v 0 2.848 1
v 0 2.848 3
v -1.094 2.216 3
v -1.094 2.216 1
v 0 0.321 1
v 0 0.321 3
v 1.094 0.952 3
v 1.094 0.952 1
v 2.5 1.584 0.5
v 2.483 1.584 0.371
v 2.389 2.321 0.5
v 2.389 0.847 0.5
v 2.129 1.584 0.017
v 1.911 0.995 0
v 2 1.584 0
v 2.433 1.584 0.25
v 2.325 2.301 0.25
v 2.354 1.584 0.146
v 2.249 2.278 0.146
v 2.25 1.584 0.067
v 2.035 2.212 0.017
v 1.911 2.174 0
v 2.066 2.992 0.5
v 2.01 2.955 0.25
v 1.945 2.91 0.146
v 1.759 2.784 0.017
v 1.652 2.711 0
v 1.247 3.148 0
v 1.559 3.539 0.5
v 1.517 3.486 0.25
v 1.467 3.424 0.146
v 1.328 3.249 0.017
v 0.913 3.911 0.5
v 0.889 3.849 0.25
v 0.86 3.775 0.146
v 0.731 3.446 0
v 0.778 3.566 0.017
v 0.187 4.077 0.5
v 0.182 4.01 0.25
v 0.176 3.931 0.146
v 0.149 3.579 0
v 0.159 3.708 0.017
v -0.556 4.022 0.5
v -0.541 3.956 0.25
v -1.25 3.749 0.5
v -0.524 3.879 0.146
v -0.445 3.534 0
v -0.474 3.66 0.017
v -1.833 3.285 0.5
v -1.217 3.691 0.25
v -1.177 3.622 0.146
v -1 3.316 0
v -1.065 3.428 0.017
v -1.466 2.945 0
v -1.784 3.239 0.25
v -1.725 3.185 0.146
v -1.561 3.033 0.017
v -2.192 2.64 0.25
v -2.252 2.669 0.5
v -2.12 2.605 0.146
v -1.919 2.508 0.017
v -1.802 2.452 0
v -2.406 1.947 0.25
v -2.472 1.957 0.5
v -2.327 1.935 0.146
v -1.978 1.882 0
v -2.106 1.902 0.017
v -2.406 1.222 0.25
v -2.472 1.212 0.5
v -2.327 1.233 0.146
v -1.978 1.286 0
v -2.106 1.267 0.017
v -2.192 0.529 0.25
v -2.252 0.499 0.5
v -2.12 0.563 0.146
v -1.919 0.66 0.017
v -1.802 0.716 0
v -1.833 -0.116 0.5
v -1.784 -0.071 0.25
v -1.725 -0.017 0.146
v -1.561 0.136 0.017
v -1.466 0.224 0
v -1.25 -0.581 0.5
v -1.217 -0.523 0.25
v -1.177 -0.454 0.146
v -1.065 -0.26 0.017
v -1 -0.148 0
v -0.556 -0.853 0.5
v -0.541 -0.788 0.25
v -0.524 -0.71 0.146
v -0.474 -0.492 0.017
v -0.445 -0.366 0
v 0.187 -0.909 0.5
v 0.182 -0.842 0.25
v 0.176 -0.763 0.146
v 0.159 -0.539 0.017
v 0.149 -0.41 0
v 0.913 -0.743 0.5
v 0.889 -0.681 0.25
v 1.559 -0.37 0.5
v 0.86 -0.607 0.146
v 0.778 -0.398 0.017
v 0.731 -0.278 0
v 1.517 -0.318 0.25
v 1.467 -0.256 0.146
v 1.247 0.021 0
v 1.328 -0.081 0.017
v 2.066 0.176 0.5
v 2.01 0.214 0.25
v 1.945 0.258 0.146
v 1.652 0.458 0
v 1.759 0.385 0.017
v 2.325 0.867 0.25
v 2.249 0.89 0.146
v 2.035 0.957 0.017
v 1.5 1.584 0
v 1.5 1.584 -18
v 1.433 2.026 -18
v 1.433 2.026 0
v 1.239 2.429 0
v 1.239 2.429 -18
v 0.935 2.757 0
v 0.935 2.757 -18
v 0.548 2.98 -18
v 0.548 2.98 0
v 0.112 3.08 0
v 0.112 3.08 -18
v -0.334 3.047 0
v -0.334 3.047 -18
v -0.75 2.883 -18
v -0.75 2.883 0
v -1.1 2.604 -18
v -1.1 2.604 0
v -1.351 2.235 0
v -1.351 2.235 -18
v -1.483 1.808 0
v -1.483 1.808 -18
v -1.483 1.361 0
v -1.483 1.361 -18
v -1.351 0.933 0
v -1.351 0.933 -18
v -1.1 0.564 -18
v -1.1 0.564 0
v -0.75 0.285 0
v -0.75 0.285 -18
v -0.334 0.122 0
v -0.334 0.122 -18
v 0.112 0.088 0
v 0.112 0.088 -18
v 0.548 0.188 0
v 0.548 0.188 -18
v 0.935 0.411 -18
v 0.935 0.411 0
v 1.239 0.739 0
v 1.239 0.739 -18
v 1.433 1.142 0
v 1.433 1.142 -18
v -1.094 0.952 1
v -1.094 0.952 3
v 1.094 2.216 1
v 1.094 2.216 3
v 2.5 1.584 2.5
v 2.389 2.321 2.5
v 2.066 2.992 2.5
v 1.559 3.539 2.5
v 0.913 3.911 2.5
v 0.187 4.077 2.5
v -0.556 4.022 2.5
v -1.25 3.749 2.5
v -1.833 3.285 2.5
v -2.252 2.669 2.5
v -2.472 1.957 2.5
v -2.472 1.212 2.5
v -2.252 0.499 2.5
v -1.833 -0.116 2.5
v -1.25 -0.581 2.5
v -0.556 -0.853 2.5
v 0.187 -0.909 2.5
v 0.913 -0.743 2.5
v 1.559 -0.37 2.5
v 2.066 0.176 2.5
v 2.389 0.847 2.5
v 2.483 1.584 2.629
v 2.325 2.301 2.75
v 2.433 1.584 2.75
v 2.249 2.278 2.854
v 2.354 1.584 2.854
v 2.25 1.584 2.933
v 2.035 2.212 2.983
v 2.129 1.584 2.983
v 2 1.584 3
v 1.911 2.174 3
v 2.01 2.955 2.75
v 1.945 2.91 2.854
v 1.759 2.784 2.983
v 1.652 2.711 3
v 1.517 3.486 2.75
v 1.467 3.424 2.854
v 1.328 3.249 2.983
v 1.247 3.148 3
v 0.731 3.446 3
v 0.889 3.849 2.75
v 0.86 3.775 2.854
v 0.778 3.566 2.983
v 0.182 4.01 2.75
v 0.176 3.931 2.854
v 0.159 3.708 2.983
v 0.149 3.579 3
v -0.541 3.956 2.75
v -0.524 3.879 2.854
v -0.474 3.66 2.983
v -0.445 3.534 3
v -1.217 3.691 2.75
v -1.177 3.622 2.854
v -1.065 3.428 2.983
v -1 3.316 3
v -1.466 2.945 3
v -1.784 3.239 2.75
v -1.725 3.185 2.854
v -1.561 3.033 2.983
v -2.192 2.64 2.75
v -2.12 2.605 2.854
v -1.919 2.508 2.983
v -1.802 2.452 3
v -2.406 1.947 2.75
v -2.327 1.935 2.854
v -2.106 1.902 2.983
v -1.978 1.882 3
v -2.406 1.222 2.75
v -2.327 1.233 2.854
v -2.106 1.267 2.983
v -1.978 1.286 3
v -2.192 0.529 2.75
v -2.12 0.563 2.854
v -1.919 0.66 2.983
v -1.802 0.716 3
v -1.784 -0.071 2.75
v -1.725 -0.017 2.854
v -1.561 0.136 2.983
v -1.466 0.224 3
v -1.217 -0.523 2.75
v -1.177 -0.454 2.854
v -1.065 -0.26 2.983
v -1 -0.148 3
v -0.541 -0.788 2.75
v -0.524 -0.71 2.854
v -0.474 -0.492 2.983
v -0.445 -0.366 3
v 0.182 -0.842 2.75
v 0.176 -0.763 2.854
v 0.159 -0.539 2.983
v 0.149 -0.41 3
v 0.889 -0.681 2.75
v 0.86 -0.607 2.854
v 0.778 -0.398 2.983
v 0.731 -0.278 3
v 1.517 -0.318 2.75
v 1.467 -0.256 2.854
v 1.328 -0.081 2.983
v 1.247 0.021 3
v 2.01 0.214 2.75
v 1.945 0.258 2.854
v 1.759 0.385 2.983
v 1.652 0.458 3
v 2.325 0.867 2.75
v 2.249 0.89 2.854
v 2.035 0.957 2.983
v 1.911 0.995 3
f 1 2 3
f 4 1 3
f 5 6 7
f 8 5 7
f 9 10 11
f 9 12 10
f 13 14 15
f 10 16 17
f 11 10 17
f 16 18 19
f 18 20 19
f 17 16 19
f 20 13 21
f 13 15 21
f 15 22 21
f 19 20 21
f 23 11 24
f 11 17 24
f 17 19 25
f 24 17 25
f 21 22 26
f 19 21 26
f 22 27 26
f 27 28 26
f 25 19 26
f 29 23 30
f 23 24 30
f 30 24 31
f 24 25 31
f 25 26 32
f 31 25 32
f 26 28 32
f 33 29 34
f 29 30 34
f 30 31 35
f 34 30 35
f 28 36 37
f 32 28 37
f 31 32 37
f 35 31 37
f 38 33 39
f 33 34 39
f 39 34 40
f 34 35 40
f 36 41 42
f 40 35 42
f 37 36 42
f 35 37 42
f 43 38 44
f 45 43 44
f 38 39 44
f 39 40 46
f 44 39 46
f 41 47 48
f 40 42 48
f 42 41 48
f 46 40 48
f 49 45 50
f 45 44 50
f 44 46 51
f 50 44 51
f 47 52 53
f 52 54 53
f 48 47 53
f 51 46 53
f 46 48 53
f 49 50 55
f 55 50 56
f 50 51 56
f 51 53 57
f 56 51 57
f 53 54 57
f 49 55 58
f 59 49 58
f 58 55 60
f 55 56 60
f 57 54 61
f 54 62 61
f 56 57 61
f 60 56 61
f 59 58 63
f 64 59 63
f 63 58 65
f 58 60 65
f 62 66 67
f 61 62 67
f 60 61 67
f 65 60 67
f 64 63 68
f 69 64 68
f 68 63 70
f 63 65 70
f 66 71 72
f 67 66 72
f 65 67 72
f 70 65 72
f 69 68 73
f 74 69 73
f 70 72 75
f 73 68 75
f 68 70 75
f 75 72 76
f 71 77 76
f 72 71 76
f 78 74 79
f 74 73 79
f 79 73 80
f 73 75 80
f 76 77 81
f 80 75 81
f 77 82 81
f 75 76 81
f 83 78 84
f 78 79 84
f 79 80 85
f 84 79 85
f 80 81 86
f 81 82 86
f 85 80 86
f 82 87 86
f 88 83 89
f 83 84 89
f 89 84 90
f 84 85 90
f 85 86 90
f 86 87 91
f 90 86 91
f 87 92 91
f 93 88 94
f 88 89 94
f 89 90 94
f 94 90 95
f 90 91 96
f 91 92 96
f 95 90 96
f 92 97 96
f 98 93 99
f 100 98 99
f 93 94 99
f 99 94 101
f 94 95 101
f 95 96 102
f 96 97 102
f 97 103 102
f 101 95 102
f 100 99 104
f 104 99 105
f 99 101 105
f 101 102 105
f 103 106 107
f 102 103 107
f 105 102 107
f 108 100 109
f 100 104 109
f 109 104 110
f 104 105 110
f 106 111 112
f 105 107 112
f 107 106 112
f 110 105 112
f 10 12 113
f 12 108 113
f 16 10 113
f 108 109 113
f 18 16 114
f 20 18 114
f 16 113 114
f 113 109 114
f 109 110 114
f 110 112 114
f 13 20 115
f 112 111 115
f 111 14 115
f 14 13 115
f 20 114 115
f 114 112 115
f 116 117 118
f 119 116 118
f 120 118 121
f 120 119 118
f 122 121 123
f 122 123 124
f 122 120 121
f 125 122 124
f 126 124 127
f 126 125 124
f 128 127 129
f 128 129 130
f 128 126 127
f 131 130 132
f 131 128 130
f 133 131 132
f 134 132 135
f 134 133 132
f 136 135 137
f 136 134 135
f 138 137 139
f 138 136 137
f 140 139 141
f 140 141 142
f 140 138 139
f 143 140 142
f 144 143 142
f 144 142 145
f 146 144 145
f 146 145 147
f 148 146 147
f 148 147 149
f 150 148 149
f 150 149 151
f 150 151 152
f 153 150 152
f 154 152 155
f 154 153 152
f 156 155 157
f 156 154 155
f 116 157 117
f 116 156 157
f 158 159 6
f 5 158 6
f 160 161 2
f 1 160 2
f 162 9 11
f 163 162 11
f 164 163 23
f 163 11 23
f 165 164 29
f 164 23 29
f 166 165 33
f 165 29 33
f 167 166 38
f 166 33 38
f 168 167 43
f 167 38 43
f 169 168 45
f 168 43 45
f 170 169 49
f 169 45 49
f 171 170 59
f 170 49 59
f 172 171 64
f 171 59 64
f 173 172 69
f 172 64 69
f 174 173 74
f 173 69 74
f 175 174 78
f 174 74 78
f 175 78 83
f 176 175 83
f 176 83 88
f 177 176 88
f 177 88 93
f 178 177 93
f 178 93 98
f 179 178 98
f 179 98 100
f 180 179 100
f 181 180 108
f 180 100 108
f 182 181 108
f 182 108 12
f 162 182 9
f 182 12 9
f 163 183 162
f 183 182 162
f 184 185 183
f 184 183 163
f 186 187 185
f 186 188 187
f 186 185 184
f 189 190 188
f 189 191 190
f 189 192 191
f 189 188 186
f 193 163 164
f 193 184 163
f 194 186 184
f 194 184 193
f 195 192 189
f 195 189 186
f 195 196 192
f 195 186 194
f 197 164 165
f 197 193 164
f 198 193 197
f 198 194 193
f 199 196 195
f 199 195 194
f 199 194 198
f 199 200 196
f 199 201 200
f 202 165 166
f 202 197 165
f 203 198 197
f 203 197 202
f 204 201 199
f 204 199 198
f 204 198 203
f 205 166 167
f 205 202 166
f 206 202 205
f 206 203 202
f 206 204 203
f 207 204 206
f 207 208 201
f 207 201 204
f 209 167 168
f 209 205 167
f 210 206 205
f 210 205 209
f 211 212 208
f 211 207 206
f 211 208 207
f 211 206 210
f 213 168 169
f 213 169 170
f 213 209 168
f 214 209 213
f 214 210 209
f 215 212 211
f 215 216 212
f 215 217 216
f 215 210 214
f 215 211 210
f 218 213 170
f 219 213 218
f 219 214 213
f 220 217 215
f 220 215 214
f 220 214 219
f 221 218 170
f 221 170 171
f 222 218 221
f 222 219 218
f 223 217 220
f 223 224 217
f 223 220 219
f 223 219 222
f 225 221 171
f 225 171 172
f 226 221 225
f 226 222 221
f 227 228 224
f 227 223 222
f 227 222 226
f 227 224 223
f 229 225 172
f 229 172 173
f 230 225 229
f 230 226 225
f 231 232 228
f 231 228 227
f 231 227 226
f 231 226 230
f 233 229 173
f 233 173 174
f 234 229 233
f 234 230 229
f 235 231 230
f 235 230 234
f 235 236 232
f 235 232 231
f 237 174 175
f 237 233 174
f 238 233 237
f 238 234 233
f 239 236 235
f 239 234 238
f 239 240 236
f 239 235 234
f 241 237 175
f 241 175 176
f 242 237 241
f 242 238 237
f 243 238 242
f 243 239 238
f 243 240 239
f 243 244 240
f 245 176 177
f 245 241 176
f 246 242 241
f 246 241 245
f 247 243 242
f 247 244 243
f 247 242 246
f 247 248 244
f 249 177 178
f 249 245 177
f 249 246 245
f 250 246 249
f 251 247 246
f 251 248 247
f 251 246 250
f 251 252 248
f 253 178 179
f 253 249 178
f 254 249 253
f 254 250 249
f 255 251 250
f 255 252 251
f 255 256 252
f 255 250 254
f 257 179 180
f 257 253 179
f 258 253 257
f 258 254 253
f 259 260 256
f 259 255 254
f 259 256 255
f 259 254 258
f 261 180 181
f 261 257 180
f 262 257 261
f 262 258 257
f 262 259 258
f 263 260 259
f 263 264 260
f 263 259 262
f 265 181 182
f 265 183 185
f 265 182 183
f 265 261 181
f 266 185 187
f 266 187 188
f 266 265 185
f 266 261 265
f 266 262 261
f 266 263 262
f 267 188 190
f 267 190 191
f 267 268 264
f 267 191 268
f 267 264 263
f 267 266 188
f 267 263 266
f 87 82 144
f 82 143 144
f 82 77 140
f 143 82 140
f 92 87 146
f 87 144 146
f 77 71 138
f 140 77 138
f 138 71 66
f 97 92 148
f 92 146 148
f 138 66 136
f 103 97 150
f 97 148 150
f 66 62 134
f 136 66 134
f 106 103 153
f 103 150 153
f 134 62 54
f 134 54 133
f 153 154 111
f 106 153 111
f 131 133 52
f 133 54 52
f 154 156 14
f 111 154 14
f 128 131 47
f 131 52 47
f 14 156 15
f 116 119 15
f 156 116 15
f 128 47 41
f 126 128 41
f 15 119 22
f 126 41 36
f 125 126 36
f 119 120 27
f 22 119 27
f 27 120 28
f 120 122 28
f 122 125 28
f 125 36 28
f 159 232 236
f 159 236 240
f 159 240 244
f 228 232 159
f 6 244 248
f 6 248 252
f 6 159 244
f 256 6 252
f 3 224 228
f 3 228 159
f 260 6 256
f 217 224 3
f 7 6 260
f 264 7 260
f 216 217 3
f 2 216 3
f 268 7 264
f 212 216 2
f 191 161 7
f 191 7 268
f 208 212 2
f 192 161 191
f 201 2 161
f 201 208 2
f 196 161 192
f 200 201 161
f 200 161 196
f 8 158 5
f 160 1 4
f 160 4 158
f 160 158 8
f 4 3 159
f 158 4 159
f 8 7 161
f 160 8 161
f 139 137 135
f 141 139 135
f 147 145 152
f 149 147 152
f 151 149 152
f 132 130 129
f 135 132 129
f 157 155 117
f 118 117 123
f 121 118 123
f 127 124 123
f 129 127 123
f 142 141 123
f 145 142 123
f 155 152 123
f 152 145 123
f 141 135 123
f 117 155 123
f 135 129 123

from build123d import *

# Parameters (mm, degrees)
SKETCH1_R           = 1.5
BOSS_EXTRUDE1_DEPTH = 18
SKETCH2_R           = 2.5
BOSS_EXTRUDE2_DEPTH = 3
FILLET1_R           = 0.5
CUT_EXTRUDE1_DEPTH  = 2


with BuildPart() as part:
    # Sketch1 → Boss-Extrude1 (new body)
    with BuildSketch(Plane.XY):
        with Locations((0, 1.584180911)):
            Circle(SKETCH1_R)
    extrude(amount=-BOSS_EXTRUDE1_DEPTH)

    # Sketch2 → Boss-Extrude2 (add)
    with BuildSketch(Plane.XY):
        with Locations((0, 1.584180911)):
            Circle(SKETCH2_R)
    extrude(amount=BOSS_EXTRUDE2_DEPTH)

    # Fillet1
    fillet1_edges = [part.edges().sort_by_distance(p)[0] for p in [
        (-2.5, 1.584180911, 0),
        (-2.5, 1.584180911, 3),
    ]]
    fillet(fillet1_edges, radius=FILLET1_R)

    # Sketch3 → Cut-Extrude1 (cut)
    with BuildSketch(Plane.XY.offset(3)):
        Polygon((0, 0.320652174), (1.094247985, 0.952416543), (1.094247985, 2.21594528), (0, 2.847709649), (-1.094247985, 2.21594528), (-1.094247985, 0.952416543), align=None)
    extrude(amount=-CUT_EXTRUDE1_DEPTH, mode=Mode.SUBTRACT)


solid = part.part
